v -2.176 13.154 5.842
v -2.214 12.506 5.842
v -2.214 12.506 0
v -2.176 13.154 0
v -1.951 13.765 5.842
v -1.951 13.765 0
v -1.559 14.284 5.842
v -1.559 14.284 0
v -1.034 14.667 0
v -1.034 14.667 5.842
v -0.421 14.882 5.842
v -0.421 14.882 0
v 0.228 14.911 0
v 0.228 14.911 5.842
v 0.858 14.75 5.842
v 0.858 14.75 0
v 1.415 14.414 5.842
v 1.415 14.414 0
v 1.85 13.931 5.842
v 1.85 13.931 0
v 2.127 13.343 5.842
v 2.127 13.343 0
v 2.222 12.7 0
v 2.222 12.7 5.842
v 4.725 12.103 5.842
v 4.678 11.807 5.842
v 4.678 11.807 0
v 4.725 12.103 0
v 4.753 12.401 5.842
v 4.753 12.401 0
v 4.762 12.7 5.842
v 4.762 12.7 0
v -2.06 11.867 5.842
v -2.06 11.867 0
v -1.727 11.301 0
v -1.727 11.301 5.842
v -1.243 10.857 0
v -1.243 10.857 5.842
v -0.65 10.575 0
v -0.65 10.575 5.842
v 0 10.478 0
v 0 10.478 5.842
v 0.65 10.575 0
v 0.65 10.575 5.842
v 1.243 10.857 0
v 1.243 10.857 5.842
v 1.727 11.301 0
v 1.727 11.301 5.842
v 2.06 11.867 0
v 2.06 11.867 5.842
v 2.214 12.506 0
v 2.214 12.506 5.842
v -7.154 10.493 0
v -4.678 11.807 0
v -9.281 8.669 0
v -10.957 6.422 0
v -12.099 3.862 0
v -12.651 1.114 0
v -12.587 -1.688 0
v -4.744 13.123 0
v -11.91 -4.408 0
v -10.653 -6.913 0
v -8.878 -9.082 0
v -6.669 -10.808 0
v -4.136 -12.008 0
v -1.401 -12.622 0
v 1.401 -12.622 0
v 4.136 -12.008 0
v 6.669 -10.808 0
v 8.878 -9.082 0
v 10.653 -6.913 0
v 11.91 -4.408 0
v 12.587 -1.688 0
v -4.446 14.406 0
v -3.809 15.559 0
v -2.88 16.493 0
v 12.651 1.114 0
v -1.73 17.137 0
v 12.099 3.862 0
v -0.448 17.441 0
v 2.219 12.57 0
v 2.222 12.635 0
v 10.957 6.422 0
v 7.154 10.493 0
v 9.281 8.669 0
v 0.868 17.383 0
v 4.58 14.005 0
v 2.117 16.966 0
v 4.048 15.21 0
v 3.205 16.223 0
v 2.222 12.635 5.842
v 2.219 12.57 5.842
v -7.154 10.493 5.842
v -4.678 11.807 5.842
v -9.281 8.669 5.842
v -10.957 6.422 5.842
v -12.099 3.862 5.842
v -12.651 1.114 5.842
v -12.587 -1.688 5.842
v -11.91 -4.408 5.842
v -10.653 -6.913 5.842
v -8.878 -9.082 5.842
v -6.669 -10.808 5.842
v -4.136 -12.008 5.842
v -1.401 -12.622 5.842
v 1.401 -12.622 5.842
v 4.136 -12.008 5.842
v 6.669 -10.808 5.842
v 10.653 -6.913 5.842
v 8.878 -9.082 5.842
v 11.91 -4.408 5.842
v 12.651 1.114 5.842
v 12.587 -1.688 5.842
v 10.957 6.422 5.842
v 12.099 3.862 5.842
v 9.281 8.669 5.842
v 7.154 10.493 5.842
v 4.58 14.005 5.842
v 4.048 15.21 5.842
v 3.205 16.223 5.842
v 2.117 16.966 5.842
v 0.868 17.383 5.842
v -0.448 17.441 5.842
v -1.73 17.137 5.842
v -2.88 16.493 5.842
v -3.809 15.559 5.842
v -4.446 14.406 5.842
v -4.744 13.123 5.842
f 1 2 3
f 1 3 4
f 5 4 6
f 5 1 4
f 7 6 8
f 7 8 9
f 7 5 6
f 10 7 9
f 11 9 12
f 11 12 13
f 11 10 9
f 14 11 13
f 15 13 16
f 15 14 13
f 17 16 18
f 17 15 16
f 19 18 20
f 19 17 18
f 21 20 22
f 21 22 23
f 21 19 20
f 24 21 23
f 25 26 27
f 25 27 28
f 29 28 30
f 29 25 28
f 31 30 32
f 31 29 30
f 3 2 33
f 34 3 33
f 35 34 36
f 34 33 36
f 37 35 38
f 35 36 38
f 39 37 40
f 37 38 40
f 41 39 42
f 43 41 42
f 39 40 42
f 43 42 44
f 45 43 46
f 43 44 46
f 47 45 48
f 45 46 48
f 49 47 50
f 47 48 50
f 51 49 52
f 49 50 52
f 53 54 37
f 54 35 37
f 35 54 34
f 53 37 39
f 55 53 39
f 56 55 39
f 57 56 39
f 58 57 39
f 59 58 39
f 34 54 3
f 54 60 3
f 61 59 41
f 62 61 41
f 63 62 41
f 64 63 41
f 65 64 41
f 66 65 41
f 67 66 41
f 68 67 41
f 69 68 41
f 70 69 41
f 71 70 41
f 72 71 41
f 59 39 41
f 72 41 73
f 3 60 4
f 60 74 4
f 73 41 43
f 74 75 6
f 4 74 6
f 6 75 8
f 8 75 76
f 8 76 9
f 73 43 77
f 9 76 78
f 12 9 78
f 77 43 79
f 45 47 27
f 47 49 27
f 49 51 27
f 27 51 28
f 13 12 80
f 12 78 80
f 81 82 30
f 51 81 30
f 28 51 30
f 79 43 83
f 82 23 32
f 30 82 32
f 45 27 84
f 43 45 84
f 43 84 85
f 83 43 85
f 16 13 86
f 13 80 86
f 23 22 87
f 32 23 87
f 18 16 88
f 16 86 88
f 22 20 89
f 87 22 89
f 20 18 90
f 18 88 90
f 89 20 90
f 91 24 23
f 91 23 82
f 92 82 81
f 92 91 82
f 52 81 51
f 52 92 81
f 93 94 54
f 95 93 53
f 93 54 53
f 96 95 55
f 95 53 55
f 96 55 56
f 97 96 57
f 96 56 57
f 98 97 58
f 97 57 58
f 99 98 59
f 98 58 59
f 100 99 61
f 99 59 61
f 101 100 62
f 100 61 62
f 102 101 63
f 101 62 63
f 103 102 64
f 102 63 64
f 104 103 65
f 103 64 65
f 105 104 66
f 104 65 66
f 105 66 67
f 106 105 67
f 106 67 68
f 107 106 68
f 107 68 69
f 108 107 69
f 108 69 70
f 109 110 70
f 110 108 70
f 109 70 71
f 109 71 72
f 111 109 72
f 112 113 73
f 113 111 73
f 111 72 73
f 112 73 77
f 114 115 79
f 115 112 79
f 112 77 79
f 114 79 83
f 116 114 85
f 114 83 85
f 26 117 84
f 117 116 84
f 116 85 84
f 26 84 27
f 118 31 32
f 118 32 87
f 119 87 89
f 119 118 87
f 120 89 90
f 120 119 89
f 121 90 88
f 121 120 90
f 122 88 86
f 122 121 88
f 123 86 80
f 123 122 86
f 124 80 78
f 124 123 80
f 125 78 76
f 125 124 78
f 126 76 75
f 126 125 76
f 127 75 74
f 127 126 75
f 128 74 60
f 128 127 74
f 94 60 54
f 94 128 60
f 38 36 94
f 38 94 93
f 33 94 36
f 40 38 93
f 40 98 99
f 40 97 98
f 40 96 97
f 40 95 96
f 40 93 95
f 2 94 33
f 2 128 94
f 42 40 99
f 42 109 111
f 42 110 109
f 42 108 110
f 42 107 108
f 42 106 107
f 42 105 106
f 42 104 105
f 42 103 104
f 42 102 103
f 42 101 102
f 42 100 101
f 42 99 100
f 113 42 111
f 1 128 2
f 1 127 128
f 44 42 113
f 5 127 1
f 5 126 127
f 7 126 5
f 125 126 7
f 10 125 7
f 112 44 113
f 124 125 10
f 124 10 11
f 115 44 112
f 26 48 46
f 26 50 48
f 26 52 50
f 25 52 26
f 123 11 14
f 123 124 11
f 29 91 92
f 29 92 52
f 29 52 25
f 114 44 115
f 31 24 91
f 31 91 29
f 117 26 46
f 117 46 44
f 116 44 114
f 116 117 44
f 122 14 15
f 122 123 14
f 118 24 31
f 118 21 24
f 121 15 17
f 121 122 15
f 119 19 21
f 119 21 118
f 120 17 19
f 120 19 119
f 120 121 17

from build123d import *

# Parameters (mm, degrees)
F0_R     = 12.7
F1_DEPTH = 5.842
F3_DEPTH = 5.842
F4_DEPTH = 25.4


with BuildPart() as f1:
    # F0 (on Top) → F1 (new body)
    with BuildSketch(Plane.XY):
        Circle(F0_R)
    extrude(amount=F1_DEPTH)

    # F2 (on face) → F3 (join)
    with BuildSketch(Plane.XY.offset(5.842)):
        with BuildLine():
            ThreePointArc((4.678035, 11.807031), (4.741337, 12.251523), (4.7625, 12.7))
            ThreePointArc((4.7625, 12.7), (-0.448477, 17.441337), (-4.678035, 11.807031))
            ThreePointArc((-4.678035, 11.807031), (-3.463658, 12.218554), (-2.213976, 12.505531))
            ThreePointArc((-2.213976, 12.505531), (-0.097328, 14.920368), (2.2225, 12.7))
            ThreePointArc((2.2225, 12.7), (2.220368, 12.602672), (2.213976, 12.505531))
            ThreePointArc((2.213976, 12.505531), (3.463658, 12.218554), (4.678035, 11.807031))
        make_face()
    extrude(amount=-F3_DEPTH)

    # F2 (on face) → F4 (cut)
    with BuildSketch(Plane.XY.offset(5.842)):
        with BuildLine():
            ThreePointArc((2.213976, 12.505531), (0, 12.7), (-2.213976, 12.505531))
            ThreePointArc((-2.213976, 12.505531), (0, 10.4775), (2.213976, 12.505531))
        make_face()
    extrude(amount=-F4_DEPTH, mode=Mode.SUBTRACT)


solid = f1.part
